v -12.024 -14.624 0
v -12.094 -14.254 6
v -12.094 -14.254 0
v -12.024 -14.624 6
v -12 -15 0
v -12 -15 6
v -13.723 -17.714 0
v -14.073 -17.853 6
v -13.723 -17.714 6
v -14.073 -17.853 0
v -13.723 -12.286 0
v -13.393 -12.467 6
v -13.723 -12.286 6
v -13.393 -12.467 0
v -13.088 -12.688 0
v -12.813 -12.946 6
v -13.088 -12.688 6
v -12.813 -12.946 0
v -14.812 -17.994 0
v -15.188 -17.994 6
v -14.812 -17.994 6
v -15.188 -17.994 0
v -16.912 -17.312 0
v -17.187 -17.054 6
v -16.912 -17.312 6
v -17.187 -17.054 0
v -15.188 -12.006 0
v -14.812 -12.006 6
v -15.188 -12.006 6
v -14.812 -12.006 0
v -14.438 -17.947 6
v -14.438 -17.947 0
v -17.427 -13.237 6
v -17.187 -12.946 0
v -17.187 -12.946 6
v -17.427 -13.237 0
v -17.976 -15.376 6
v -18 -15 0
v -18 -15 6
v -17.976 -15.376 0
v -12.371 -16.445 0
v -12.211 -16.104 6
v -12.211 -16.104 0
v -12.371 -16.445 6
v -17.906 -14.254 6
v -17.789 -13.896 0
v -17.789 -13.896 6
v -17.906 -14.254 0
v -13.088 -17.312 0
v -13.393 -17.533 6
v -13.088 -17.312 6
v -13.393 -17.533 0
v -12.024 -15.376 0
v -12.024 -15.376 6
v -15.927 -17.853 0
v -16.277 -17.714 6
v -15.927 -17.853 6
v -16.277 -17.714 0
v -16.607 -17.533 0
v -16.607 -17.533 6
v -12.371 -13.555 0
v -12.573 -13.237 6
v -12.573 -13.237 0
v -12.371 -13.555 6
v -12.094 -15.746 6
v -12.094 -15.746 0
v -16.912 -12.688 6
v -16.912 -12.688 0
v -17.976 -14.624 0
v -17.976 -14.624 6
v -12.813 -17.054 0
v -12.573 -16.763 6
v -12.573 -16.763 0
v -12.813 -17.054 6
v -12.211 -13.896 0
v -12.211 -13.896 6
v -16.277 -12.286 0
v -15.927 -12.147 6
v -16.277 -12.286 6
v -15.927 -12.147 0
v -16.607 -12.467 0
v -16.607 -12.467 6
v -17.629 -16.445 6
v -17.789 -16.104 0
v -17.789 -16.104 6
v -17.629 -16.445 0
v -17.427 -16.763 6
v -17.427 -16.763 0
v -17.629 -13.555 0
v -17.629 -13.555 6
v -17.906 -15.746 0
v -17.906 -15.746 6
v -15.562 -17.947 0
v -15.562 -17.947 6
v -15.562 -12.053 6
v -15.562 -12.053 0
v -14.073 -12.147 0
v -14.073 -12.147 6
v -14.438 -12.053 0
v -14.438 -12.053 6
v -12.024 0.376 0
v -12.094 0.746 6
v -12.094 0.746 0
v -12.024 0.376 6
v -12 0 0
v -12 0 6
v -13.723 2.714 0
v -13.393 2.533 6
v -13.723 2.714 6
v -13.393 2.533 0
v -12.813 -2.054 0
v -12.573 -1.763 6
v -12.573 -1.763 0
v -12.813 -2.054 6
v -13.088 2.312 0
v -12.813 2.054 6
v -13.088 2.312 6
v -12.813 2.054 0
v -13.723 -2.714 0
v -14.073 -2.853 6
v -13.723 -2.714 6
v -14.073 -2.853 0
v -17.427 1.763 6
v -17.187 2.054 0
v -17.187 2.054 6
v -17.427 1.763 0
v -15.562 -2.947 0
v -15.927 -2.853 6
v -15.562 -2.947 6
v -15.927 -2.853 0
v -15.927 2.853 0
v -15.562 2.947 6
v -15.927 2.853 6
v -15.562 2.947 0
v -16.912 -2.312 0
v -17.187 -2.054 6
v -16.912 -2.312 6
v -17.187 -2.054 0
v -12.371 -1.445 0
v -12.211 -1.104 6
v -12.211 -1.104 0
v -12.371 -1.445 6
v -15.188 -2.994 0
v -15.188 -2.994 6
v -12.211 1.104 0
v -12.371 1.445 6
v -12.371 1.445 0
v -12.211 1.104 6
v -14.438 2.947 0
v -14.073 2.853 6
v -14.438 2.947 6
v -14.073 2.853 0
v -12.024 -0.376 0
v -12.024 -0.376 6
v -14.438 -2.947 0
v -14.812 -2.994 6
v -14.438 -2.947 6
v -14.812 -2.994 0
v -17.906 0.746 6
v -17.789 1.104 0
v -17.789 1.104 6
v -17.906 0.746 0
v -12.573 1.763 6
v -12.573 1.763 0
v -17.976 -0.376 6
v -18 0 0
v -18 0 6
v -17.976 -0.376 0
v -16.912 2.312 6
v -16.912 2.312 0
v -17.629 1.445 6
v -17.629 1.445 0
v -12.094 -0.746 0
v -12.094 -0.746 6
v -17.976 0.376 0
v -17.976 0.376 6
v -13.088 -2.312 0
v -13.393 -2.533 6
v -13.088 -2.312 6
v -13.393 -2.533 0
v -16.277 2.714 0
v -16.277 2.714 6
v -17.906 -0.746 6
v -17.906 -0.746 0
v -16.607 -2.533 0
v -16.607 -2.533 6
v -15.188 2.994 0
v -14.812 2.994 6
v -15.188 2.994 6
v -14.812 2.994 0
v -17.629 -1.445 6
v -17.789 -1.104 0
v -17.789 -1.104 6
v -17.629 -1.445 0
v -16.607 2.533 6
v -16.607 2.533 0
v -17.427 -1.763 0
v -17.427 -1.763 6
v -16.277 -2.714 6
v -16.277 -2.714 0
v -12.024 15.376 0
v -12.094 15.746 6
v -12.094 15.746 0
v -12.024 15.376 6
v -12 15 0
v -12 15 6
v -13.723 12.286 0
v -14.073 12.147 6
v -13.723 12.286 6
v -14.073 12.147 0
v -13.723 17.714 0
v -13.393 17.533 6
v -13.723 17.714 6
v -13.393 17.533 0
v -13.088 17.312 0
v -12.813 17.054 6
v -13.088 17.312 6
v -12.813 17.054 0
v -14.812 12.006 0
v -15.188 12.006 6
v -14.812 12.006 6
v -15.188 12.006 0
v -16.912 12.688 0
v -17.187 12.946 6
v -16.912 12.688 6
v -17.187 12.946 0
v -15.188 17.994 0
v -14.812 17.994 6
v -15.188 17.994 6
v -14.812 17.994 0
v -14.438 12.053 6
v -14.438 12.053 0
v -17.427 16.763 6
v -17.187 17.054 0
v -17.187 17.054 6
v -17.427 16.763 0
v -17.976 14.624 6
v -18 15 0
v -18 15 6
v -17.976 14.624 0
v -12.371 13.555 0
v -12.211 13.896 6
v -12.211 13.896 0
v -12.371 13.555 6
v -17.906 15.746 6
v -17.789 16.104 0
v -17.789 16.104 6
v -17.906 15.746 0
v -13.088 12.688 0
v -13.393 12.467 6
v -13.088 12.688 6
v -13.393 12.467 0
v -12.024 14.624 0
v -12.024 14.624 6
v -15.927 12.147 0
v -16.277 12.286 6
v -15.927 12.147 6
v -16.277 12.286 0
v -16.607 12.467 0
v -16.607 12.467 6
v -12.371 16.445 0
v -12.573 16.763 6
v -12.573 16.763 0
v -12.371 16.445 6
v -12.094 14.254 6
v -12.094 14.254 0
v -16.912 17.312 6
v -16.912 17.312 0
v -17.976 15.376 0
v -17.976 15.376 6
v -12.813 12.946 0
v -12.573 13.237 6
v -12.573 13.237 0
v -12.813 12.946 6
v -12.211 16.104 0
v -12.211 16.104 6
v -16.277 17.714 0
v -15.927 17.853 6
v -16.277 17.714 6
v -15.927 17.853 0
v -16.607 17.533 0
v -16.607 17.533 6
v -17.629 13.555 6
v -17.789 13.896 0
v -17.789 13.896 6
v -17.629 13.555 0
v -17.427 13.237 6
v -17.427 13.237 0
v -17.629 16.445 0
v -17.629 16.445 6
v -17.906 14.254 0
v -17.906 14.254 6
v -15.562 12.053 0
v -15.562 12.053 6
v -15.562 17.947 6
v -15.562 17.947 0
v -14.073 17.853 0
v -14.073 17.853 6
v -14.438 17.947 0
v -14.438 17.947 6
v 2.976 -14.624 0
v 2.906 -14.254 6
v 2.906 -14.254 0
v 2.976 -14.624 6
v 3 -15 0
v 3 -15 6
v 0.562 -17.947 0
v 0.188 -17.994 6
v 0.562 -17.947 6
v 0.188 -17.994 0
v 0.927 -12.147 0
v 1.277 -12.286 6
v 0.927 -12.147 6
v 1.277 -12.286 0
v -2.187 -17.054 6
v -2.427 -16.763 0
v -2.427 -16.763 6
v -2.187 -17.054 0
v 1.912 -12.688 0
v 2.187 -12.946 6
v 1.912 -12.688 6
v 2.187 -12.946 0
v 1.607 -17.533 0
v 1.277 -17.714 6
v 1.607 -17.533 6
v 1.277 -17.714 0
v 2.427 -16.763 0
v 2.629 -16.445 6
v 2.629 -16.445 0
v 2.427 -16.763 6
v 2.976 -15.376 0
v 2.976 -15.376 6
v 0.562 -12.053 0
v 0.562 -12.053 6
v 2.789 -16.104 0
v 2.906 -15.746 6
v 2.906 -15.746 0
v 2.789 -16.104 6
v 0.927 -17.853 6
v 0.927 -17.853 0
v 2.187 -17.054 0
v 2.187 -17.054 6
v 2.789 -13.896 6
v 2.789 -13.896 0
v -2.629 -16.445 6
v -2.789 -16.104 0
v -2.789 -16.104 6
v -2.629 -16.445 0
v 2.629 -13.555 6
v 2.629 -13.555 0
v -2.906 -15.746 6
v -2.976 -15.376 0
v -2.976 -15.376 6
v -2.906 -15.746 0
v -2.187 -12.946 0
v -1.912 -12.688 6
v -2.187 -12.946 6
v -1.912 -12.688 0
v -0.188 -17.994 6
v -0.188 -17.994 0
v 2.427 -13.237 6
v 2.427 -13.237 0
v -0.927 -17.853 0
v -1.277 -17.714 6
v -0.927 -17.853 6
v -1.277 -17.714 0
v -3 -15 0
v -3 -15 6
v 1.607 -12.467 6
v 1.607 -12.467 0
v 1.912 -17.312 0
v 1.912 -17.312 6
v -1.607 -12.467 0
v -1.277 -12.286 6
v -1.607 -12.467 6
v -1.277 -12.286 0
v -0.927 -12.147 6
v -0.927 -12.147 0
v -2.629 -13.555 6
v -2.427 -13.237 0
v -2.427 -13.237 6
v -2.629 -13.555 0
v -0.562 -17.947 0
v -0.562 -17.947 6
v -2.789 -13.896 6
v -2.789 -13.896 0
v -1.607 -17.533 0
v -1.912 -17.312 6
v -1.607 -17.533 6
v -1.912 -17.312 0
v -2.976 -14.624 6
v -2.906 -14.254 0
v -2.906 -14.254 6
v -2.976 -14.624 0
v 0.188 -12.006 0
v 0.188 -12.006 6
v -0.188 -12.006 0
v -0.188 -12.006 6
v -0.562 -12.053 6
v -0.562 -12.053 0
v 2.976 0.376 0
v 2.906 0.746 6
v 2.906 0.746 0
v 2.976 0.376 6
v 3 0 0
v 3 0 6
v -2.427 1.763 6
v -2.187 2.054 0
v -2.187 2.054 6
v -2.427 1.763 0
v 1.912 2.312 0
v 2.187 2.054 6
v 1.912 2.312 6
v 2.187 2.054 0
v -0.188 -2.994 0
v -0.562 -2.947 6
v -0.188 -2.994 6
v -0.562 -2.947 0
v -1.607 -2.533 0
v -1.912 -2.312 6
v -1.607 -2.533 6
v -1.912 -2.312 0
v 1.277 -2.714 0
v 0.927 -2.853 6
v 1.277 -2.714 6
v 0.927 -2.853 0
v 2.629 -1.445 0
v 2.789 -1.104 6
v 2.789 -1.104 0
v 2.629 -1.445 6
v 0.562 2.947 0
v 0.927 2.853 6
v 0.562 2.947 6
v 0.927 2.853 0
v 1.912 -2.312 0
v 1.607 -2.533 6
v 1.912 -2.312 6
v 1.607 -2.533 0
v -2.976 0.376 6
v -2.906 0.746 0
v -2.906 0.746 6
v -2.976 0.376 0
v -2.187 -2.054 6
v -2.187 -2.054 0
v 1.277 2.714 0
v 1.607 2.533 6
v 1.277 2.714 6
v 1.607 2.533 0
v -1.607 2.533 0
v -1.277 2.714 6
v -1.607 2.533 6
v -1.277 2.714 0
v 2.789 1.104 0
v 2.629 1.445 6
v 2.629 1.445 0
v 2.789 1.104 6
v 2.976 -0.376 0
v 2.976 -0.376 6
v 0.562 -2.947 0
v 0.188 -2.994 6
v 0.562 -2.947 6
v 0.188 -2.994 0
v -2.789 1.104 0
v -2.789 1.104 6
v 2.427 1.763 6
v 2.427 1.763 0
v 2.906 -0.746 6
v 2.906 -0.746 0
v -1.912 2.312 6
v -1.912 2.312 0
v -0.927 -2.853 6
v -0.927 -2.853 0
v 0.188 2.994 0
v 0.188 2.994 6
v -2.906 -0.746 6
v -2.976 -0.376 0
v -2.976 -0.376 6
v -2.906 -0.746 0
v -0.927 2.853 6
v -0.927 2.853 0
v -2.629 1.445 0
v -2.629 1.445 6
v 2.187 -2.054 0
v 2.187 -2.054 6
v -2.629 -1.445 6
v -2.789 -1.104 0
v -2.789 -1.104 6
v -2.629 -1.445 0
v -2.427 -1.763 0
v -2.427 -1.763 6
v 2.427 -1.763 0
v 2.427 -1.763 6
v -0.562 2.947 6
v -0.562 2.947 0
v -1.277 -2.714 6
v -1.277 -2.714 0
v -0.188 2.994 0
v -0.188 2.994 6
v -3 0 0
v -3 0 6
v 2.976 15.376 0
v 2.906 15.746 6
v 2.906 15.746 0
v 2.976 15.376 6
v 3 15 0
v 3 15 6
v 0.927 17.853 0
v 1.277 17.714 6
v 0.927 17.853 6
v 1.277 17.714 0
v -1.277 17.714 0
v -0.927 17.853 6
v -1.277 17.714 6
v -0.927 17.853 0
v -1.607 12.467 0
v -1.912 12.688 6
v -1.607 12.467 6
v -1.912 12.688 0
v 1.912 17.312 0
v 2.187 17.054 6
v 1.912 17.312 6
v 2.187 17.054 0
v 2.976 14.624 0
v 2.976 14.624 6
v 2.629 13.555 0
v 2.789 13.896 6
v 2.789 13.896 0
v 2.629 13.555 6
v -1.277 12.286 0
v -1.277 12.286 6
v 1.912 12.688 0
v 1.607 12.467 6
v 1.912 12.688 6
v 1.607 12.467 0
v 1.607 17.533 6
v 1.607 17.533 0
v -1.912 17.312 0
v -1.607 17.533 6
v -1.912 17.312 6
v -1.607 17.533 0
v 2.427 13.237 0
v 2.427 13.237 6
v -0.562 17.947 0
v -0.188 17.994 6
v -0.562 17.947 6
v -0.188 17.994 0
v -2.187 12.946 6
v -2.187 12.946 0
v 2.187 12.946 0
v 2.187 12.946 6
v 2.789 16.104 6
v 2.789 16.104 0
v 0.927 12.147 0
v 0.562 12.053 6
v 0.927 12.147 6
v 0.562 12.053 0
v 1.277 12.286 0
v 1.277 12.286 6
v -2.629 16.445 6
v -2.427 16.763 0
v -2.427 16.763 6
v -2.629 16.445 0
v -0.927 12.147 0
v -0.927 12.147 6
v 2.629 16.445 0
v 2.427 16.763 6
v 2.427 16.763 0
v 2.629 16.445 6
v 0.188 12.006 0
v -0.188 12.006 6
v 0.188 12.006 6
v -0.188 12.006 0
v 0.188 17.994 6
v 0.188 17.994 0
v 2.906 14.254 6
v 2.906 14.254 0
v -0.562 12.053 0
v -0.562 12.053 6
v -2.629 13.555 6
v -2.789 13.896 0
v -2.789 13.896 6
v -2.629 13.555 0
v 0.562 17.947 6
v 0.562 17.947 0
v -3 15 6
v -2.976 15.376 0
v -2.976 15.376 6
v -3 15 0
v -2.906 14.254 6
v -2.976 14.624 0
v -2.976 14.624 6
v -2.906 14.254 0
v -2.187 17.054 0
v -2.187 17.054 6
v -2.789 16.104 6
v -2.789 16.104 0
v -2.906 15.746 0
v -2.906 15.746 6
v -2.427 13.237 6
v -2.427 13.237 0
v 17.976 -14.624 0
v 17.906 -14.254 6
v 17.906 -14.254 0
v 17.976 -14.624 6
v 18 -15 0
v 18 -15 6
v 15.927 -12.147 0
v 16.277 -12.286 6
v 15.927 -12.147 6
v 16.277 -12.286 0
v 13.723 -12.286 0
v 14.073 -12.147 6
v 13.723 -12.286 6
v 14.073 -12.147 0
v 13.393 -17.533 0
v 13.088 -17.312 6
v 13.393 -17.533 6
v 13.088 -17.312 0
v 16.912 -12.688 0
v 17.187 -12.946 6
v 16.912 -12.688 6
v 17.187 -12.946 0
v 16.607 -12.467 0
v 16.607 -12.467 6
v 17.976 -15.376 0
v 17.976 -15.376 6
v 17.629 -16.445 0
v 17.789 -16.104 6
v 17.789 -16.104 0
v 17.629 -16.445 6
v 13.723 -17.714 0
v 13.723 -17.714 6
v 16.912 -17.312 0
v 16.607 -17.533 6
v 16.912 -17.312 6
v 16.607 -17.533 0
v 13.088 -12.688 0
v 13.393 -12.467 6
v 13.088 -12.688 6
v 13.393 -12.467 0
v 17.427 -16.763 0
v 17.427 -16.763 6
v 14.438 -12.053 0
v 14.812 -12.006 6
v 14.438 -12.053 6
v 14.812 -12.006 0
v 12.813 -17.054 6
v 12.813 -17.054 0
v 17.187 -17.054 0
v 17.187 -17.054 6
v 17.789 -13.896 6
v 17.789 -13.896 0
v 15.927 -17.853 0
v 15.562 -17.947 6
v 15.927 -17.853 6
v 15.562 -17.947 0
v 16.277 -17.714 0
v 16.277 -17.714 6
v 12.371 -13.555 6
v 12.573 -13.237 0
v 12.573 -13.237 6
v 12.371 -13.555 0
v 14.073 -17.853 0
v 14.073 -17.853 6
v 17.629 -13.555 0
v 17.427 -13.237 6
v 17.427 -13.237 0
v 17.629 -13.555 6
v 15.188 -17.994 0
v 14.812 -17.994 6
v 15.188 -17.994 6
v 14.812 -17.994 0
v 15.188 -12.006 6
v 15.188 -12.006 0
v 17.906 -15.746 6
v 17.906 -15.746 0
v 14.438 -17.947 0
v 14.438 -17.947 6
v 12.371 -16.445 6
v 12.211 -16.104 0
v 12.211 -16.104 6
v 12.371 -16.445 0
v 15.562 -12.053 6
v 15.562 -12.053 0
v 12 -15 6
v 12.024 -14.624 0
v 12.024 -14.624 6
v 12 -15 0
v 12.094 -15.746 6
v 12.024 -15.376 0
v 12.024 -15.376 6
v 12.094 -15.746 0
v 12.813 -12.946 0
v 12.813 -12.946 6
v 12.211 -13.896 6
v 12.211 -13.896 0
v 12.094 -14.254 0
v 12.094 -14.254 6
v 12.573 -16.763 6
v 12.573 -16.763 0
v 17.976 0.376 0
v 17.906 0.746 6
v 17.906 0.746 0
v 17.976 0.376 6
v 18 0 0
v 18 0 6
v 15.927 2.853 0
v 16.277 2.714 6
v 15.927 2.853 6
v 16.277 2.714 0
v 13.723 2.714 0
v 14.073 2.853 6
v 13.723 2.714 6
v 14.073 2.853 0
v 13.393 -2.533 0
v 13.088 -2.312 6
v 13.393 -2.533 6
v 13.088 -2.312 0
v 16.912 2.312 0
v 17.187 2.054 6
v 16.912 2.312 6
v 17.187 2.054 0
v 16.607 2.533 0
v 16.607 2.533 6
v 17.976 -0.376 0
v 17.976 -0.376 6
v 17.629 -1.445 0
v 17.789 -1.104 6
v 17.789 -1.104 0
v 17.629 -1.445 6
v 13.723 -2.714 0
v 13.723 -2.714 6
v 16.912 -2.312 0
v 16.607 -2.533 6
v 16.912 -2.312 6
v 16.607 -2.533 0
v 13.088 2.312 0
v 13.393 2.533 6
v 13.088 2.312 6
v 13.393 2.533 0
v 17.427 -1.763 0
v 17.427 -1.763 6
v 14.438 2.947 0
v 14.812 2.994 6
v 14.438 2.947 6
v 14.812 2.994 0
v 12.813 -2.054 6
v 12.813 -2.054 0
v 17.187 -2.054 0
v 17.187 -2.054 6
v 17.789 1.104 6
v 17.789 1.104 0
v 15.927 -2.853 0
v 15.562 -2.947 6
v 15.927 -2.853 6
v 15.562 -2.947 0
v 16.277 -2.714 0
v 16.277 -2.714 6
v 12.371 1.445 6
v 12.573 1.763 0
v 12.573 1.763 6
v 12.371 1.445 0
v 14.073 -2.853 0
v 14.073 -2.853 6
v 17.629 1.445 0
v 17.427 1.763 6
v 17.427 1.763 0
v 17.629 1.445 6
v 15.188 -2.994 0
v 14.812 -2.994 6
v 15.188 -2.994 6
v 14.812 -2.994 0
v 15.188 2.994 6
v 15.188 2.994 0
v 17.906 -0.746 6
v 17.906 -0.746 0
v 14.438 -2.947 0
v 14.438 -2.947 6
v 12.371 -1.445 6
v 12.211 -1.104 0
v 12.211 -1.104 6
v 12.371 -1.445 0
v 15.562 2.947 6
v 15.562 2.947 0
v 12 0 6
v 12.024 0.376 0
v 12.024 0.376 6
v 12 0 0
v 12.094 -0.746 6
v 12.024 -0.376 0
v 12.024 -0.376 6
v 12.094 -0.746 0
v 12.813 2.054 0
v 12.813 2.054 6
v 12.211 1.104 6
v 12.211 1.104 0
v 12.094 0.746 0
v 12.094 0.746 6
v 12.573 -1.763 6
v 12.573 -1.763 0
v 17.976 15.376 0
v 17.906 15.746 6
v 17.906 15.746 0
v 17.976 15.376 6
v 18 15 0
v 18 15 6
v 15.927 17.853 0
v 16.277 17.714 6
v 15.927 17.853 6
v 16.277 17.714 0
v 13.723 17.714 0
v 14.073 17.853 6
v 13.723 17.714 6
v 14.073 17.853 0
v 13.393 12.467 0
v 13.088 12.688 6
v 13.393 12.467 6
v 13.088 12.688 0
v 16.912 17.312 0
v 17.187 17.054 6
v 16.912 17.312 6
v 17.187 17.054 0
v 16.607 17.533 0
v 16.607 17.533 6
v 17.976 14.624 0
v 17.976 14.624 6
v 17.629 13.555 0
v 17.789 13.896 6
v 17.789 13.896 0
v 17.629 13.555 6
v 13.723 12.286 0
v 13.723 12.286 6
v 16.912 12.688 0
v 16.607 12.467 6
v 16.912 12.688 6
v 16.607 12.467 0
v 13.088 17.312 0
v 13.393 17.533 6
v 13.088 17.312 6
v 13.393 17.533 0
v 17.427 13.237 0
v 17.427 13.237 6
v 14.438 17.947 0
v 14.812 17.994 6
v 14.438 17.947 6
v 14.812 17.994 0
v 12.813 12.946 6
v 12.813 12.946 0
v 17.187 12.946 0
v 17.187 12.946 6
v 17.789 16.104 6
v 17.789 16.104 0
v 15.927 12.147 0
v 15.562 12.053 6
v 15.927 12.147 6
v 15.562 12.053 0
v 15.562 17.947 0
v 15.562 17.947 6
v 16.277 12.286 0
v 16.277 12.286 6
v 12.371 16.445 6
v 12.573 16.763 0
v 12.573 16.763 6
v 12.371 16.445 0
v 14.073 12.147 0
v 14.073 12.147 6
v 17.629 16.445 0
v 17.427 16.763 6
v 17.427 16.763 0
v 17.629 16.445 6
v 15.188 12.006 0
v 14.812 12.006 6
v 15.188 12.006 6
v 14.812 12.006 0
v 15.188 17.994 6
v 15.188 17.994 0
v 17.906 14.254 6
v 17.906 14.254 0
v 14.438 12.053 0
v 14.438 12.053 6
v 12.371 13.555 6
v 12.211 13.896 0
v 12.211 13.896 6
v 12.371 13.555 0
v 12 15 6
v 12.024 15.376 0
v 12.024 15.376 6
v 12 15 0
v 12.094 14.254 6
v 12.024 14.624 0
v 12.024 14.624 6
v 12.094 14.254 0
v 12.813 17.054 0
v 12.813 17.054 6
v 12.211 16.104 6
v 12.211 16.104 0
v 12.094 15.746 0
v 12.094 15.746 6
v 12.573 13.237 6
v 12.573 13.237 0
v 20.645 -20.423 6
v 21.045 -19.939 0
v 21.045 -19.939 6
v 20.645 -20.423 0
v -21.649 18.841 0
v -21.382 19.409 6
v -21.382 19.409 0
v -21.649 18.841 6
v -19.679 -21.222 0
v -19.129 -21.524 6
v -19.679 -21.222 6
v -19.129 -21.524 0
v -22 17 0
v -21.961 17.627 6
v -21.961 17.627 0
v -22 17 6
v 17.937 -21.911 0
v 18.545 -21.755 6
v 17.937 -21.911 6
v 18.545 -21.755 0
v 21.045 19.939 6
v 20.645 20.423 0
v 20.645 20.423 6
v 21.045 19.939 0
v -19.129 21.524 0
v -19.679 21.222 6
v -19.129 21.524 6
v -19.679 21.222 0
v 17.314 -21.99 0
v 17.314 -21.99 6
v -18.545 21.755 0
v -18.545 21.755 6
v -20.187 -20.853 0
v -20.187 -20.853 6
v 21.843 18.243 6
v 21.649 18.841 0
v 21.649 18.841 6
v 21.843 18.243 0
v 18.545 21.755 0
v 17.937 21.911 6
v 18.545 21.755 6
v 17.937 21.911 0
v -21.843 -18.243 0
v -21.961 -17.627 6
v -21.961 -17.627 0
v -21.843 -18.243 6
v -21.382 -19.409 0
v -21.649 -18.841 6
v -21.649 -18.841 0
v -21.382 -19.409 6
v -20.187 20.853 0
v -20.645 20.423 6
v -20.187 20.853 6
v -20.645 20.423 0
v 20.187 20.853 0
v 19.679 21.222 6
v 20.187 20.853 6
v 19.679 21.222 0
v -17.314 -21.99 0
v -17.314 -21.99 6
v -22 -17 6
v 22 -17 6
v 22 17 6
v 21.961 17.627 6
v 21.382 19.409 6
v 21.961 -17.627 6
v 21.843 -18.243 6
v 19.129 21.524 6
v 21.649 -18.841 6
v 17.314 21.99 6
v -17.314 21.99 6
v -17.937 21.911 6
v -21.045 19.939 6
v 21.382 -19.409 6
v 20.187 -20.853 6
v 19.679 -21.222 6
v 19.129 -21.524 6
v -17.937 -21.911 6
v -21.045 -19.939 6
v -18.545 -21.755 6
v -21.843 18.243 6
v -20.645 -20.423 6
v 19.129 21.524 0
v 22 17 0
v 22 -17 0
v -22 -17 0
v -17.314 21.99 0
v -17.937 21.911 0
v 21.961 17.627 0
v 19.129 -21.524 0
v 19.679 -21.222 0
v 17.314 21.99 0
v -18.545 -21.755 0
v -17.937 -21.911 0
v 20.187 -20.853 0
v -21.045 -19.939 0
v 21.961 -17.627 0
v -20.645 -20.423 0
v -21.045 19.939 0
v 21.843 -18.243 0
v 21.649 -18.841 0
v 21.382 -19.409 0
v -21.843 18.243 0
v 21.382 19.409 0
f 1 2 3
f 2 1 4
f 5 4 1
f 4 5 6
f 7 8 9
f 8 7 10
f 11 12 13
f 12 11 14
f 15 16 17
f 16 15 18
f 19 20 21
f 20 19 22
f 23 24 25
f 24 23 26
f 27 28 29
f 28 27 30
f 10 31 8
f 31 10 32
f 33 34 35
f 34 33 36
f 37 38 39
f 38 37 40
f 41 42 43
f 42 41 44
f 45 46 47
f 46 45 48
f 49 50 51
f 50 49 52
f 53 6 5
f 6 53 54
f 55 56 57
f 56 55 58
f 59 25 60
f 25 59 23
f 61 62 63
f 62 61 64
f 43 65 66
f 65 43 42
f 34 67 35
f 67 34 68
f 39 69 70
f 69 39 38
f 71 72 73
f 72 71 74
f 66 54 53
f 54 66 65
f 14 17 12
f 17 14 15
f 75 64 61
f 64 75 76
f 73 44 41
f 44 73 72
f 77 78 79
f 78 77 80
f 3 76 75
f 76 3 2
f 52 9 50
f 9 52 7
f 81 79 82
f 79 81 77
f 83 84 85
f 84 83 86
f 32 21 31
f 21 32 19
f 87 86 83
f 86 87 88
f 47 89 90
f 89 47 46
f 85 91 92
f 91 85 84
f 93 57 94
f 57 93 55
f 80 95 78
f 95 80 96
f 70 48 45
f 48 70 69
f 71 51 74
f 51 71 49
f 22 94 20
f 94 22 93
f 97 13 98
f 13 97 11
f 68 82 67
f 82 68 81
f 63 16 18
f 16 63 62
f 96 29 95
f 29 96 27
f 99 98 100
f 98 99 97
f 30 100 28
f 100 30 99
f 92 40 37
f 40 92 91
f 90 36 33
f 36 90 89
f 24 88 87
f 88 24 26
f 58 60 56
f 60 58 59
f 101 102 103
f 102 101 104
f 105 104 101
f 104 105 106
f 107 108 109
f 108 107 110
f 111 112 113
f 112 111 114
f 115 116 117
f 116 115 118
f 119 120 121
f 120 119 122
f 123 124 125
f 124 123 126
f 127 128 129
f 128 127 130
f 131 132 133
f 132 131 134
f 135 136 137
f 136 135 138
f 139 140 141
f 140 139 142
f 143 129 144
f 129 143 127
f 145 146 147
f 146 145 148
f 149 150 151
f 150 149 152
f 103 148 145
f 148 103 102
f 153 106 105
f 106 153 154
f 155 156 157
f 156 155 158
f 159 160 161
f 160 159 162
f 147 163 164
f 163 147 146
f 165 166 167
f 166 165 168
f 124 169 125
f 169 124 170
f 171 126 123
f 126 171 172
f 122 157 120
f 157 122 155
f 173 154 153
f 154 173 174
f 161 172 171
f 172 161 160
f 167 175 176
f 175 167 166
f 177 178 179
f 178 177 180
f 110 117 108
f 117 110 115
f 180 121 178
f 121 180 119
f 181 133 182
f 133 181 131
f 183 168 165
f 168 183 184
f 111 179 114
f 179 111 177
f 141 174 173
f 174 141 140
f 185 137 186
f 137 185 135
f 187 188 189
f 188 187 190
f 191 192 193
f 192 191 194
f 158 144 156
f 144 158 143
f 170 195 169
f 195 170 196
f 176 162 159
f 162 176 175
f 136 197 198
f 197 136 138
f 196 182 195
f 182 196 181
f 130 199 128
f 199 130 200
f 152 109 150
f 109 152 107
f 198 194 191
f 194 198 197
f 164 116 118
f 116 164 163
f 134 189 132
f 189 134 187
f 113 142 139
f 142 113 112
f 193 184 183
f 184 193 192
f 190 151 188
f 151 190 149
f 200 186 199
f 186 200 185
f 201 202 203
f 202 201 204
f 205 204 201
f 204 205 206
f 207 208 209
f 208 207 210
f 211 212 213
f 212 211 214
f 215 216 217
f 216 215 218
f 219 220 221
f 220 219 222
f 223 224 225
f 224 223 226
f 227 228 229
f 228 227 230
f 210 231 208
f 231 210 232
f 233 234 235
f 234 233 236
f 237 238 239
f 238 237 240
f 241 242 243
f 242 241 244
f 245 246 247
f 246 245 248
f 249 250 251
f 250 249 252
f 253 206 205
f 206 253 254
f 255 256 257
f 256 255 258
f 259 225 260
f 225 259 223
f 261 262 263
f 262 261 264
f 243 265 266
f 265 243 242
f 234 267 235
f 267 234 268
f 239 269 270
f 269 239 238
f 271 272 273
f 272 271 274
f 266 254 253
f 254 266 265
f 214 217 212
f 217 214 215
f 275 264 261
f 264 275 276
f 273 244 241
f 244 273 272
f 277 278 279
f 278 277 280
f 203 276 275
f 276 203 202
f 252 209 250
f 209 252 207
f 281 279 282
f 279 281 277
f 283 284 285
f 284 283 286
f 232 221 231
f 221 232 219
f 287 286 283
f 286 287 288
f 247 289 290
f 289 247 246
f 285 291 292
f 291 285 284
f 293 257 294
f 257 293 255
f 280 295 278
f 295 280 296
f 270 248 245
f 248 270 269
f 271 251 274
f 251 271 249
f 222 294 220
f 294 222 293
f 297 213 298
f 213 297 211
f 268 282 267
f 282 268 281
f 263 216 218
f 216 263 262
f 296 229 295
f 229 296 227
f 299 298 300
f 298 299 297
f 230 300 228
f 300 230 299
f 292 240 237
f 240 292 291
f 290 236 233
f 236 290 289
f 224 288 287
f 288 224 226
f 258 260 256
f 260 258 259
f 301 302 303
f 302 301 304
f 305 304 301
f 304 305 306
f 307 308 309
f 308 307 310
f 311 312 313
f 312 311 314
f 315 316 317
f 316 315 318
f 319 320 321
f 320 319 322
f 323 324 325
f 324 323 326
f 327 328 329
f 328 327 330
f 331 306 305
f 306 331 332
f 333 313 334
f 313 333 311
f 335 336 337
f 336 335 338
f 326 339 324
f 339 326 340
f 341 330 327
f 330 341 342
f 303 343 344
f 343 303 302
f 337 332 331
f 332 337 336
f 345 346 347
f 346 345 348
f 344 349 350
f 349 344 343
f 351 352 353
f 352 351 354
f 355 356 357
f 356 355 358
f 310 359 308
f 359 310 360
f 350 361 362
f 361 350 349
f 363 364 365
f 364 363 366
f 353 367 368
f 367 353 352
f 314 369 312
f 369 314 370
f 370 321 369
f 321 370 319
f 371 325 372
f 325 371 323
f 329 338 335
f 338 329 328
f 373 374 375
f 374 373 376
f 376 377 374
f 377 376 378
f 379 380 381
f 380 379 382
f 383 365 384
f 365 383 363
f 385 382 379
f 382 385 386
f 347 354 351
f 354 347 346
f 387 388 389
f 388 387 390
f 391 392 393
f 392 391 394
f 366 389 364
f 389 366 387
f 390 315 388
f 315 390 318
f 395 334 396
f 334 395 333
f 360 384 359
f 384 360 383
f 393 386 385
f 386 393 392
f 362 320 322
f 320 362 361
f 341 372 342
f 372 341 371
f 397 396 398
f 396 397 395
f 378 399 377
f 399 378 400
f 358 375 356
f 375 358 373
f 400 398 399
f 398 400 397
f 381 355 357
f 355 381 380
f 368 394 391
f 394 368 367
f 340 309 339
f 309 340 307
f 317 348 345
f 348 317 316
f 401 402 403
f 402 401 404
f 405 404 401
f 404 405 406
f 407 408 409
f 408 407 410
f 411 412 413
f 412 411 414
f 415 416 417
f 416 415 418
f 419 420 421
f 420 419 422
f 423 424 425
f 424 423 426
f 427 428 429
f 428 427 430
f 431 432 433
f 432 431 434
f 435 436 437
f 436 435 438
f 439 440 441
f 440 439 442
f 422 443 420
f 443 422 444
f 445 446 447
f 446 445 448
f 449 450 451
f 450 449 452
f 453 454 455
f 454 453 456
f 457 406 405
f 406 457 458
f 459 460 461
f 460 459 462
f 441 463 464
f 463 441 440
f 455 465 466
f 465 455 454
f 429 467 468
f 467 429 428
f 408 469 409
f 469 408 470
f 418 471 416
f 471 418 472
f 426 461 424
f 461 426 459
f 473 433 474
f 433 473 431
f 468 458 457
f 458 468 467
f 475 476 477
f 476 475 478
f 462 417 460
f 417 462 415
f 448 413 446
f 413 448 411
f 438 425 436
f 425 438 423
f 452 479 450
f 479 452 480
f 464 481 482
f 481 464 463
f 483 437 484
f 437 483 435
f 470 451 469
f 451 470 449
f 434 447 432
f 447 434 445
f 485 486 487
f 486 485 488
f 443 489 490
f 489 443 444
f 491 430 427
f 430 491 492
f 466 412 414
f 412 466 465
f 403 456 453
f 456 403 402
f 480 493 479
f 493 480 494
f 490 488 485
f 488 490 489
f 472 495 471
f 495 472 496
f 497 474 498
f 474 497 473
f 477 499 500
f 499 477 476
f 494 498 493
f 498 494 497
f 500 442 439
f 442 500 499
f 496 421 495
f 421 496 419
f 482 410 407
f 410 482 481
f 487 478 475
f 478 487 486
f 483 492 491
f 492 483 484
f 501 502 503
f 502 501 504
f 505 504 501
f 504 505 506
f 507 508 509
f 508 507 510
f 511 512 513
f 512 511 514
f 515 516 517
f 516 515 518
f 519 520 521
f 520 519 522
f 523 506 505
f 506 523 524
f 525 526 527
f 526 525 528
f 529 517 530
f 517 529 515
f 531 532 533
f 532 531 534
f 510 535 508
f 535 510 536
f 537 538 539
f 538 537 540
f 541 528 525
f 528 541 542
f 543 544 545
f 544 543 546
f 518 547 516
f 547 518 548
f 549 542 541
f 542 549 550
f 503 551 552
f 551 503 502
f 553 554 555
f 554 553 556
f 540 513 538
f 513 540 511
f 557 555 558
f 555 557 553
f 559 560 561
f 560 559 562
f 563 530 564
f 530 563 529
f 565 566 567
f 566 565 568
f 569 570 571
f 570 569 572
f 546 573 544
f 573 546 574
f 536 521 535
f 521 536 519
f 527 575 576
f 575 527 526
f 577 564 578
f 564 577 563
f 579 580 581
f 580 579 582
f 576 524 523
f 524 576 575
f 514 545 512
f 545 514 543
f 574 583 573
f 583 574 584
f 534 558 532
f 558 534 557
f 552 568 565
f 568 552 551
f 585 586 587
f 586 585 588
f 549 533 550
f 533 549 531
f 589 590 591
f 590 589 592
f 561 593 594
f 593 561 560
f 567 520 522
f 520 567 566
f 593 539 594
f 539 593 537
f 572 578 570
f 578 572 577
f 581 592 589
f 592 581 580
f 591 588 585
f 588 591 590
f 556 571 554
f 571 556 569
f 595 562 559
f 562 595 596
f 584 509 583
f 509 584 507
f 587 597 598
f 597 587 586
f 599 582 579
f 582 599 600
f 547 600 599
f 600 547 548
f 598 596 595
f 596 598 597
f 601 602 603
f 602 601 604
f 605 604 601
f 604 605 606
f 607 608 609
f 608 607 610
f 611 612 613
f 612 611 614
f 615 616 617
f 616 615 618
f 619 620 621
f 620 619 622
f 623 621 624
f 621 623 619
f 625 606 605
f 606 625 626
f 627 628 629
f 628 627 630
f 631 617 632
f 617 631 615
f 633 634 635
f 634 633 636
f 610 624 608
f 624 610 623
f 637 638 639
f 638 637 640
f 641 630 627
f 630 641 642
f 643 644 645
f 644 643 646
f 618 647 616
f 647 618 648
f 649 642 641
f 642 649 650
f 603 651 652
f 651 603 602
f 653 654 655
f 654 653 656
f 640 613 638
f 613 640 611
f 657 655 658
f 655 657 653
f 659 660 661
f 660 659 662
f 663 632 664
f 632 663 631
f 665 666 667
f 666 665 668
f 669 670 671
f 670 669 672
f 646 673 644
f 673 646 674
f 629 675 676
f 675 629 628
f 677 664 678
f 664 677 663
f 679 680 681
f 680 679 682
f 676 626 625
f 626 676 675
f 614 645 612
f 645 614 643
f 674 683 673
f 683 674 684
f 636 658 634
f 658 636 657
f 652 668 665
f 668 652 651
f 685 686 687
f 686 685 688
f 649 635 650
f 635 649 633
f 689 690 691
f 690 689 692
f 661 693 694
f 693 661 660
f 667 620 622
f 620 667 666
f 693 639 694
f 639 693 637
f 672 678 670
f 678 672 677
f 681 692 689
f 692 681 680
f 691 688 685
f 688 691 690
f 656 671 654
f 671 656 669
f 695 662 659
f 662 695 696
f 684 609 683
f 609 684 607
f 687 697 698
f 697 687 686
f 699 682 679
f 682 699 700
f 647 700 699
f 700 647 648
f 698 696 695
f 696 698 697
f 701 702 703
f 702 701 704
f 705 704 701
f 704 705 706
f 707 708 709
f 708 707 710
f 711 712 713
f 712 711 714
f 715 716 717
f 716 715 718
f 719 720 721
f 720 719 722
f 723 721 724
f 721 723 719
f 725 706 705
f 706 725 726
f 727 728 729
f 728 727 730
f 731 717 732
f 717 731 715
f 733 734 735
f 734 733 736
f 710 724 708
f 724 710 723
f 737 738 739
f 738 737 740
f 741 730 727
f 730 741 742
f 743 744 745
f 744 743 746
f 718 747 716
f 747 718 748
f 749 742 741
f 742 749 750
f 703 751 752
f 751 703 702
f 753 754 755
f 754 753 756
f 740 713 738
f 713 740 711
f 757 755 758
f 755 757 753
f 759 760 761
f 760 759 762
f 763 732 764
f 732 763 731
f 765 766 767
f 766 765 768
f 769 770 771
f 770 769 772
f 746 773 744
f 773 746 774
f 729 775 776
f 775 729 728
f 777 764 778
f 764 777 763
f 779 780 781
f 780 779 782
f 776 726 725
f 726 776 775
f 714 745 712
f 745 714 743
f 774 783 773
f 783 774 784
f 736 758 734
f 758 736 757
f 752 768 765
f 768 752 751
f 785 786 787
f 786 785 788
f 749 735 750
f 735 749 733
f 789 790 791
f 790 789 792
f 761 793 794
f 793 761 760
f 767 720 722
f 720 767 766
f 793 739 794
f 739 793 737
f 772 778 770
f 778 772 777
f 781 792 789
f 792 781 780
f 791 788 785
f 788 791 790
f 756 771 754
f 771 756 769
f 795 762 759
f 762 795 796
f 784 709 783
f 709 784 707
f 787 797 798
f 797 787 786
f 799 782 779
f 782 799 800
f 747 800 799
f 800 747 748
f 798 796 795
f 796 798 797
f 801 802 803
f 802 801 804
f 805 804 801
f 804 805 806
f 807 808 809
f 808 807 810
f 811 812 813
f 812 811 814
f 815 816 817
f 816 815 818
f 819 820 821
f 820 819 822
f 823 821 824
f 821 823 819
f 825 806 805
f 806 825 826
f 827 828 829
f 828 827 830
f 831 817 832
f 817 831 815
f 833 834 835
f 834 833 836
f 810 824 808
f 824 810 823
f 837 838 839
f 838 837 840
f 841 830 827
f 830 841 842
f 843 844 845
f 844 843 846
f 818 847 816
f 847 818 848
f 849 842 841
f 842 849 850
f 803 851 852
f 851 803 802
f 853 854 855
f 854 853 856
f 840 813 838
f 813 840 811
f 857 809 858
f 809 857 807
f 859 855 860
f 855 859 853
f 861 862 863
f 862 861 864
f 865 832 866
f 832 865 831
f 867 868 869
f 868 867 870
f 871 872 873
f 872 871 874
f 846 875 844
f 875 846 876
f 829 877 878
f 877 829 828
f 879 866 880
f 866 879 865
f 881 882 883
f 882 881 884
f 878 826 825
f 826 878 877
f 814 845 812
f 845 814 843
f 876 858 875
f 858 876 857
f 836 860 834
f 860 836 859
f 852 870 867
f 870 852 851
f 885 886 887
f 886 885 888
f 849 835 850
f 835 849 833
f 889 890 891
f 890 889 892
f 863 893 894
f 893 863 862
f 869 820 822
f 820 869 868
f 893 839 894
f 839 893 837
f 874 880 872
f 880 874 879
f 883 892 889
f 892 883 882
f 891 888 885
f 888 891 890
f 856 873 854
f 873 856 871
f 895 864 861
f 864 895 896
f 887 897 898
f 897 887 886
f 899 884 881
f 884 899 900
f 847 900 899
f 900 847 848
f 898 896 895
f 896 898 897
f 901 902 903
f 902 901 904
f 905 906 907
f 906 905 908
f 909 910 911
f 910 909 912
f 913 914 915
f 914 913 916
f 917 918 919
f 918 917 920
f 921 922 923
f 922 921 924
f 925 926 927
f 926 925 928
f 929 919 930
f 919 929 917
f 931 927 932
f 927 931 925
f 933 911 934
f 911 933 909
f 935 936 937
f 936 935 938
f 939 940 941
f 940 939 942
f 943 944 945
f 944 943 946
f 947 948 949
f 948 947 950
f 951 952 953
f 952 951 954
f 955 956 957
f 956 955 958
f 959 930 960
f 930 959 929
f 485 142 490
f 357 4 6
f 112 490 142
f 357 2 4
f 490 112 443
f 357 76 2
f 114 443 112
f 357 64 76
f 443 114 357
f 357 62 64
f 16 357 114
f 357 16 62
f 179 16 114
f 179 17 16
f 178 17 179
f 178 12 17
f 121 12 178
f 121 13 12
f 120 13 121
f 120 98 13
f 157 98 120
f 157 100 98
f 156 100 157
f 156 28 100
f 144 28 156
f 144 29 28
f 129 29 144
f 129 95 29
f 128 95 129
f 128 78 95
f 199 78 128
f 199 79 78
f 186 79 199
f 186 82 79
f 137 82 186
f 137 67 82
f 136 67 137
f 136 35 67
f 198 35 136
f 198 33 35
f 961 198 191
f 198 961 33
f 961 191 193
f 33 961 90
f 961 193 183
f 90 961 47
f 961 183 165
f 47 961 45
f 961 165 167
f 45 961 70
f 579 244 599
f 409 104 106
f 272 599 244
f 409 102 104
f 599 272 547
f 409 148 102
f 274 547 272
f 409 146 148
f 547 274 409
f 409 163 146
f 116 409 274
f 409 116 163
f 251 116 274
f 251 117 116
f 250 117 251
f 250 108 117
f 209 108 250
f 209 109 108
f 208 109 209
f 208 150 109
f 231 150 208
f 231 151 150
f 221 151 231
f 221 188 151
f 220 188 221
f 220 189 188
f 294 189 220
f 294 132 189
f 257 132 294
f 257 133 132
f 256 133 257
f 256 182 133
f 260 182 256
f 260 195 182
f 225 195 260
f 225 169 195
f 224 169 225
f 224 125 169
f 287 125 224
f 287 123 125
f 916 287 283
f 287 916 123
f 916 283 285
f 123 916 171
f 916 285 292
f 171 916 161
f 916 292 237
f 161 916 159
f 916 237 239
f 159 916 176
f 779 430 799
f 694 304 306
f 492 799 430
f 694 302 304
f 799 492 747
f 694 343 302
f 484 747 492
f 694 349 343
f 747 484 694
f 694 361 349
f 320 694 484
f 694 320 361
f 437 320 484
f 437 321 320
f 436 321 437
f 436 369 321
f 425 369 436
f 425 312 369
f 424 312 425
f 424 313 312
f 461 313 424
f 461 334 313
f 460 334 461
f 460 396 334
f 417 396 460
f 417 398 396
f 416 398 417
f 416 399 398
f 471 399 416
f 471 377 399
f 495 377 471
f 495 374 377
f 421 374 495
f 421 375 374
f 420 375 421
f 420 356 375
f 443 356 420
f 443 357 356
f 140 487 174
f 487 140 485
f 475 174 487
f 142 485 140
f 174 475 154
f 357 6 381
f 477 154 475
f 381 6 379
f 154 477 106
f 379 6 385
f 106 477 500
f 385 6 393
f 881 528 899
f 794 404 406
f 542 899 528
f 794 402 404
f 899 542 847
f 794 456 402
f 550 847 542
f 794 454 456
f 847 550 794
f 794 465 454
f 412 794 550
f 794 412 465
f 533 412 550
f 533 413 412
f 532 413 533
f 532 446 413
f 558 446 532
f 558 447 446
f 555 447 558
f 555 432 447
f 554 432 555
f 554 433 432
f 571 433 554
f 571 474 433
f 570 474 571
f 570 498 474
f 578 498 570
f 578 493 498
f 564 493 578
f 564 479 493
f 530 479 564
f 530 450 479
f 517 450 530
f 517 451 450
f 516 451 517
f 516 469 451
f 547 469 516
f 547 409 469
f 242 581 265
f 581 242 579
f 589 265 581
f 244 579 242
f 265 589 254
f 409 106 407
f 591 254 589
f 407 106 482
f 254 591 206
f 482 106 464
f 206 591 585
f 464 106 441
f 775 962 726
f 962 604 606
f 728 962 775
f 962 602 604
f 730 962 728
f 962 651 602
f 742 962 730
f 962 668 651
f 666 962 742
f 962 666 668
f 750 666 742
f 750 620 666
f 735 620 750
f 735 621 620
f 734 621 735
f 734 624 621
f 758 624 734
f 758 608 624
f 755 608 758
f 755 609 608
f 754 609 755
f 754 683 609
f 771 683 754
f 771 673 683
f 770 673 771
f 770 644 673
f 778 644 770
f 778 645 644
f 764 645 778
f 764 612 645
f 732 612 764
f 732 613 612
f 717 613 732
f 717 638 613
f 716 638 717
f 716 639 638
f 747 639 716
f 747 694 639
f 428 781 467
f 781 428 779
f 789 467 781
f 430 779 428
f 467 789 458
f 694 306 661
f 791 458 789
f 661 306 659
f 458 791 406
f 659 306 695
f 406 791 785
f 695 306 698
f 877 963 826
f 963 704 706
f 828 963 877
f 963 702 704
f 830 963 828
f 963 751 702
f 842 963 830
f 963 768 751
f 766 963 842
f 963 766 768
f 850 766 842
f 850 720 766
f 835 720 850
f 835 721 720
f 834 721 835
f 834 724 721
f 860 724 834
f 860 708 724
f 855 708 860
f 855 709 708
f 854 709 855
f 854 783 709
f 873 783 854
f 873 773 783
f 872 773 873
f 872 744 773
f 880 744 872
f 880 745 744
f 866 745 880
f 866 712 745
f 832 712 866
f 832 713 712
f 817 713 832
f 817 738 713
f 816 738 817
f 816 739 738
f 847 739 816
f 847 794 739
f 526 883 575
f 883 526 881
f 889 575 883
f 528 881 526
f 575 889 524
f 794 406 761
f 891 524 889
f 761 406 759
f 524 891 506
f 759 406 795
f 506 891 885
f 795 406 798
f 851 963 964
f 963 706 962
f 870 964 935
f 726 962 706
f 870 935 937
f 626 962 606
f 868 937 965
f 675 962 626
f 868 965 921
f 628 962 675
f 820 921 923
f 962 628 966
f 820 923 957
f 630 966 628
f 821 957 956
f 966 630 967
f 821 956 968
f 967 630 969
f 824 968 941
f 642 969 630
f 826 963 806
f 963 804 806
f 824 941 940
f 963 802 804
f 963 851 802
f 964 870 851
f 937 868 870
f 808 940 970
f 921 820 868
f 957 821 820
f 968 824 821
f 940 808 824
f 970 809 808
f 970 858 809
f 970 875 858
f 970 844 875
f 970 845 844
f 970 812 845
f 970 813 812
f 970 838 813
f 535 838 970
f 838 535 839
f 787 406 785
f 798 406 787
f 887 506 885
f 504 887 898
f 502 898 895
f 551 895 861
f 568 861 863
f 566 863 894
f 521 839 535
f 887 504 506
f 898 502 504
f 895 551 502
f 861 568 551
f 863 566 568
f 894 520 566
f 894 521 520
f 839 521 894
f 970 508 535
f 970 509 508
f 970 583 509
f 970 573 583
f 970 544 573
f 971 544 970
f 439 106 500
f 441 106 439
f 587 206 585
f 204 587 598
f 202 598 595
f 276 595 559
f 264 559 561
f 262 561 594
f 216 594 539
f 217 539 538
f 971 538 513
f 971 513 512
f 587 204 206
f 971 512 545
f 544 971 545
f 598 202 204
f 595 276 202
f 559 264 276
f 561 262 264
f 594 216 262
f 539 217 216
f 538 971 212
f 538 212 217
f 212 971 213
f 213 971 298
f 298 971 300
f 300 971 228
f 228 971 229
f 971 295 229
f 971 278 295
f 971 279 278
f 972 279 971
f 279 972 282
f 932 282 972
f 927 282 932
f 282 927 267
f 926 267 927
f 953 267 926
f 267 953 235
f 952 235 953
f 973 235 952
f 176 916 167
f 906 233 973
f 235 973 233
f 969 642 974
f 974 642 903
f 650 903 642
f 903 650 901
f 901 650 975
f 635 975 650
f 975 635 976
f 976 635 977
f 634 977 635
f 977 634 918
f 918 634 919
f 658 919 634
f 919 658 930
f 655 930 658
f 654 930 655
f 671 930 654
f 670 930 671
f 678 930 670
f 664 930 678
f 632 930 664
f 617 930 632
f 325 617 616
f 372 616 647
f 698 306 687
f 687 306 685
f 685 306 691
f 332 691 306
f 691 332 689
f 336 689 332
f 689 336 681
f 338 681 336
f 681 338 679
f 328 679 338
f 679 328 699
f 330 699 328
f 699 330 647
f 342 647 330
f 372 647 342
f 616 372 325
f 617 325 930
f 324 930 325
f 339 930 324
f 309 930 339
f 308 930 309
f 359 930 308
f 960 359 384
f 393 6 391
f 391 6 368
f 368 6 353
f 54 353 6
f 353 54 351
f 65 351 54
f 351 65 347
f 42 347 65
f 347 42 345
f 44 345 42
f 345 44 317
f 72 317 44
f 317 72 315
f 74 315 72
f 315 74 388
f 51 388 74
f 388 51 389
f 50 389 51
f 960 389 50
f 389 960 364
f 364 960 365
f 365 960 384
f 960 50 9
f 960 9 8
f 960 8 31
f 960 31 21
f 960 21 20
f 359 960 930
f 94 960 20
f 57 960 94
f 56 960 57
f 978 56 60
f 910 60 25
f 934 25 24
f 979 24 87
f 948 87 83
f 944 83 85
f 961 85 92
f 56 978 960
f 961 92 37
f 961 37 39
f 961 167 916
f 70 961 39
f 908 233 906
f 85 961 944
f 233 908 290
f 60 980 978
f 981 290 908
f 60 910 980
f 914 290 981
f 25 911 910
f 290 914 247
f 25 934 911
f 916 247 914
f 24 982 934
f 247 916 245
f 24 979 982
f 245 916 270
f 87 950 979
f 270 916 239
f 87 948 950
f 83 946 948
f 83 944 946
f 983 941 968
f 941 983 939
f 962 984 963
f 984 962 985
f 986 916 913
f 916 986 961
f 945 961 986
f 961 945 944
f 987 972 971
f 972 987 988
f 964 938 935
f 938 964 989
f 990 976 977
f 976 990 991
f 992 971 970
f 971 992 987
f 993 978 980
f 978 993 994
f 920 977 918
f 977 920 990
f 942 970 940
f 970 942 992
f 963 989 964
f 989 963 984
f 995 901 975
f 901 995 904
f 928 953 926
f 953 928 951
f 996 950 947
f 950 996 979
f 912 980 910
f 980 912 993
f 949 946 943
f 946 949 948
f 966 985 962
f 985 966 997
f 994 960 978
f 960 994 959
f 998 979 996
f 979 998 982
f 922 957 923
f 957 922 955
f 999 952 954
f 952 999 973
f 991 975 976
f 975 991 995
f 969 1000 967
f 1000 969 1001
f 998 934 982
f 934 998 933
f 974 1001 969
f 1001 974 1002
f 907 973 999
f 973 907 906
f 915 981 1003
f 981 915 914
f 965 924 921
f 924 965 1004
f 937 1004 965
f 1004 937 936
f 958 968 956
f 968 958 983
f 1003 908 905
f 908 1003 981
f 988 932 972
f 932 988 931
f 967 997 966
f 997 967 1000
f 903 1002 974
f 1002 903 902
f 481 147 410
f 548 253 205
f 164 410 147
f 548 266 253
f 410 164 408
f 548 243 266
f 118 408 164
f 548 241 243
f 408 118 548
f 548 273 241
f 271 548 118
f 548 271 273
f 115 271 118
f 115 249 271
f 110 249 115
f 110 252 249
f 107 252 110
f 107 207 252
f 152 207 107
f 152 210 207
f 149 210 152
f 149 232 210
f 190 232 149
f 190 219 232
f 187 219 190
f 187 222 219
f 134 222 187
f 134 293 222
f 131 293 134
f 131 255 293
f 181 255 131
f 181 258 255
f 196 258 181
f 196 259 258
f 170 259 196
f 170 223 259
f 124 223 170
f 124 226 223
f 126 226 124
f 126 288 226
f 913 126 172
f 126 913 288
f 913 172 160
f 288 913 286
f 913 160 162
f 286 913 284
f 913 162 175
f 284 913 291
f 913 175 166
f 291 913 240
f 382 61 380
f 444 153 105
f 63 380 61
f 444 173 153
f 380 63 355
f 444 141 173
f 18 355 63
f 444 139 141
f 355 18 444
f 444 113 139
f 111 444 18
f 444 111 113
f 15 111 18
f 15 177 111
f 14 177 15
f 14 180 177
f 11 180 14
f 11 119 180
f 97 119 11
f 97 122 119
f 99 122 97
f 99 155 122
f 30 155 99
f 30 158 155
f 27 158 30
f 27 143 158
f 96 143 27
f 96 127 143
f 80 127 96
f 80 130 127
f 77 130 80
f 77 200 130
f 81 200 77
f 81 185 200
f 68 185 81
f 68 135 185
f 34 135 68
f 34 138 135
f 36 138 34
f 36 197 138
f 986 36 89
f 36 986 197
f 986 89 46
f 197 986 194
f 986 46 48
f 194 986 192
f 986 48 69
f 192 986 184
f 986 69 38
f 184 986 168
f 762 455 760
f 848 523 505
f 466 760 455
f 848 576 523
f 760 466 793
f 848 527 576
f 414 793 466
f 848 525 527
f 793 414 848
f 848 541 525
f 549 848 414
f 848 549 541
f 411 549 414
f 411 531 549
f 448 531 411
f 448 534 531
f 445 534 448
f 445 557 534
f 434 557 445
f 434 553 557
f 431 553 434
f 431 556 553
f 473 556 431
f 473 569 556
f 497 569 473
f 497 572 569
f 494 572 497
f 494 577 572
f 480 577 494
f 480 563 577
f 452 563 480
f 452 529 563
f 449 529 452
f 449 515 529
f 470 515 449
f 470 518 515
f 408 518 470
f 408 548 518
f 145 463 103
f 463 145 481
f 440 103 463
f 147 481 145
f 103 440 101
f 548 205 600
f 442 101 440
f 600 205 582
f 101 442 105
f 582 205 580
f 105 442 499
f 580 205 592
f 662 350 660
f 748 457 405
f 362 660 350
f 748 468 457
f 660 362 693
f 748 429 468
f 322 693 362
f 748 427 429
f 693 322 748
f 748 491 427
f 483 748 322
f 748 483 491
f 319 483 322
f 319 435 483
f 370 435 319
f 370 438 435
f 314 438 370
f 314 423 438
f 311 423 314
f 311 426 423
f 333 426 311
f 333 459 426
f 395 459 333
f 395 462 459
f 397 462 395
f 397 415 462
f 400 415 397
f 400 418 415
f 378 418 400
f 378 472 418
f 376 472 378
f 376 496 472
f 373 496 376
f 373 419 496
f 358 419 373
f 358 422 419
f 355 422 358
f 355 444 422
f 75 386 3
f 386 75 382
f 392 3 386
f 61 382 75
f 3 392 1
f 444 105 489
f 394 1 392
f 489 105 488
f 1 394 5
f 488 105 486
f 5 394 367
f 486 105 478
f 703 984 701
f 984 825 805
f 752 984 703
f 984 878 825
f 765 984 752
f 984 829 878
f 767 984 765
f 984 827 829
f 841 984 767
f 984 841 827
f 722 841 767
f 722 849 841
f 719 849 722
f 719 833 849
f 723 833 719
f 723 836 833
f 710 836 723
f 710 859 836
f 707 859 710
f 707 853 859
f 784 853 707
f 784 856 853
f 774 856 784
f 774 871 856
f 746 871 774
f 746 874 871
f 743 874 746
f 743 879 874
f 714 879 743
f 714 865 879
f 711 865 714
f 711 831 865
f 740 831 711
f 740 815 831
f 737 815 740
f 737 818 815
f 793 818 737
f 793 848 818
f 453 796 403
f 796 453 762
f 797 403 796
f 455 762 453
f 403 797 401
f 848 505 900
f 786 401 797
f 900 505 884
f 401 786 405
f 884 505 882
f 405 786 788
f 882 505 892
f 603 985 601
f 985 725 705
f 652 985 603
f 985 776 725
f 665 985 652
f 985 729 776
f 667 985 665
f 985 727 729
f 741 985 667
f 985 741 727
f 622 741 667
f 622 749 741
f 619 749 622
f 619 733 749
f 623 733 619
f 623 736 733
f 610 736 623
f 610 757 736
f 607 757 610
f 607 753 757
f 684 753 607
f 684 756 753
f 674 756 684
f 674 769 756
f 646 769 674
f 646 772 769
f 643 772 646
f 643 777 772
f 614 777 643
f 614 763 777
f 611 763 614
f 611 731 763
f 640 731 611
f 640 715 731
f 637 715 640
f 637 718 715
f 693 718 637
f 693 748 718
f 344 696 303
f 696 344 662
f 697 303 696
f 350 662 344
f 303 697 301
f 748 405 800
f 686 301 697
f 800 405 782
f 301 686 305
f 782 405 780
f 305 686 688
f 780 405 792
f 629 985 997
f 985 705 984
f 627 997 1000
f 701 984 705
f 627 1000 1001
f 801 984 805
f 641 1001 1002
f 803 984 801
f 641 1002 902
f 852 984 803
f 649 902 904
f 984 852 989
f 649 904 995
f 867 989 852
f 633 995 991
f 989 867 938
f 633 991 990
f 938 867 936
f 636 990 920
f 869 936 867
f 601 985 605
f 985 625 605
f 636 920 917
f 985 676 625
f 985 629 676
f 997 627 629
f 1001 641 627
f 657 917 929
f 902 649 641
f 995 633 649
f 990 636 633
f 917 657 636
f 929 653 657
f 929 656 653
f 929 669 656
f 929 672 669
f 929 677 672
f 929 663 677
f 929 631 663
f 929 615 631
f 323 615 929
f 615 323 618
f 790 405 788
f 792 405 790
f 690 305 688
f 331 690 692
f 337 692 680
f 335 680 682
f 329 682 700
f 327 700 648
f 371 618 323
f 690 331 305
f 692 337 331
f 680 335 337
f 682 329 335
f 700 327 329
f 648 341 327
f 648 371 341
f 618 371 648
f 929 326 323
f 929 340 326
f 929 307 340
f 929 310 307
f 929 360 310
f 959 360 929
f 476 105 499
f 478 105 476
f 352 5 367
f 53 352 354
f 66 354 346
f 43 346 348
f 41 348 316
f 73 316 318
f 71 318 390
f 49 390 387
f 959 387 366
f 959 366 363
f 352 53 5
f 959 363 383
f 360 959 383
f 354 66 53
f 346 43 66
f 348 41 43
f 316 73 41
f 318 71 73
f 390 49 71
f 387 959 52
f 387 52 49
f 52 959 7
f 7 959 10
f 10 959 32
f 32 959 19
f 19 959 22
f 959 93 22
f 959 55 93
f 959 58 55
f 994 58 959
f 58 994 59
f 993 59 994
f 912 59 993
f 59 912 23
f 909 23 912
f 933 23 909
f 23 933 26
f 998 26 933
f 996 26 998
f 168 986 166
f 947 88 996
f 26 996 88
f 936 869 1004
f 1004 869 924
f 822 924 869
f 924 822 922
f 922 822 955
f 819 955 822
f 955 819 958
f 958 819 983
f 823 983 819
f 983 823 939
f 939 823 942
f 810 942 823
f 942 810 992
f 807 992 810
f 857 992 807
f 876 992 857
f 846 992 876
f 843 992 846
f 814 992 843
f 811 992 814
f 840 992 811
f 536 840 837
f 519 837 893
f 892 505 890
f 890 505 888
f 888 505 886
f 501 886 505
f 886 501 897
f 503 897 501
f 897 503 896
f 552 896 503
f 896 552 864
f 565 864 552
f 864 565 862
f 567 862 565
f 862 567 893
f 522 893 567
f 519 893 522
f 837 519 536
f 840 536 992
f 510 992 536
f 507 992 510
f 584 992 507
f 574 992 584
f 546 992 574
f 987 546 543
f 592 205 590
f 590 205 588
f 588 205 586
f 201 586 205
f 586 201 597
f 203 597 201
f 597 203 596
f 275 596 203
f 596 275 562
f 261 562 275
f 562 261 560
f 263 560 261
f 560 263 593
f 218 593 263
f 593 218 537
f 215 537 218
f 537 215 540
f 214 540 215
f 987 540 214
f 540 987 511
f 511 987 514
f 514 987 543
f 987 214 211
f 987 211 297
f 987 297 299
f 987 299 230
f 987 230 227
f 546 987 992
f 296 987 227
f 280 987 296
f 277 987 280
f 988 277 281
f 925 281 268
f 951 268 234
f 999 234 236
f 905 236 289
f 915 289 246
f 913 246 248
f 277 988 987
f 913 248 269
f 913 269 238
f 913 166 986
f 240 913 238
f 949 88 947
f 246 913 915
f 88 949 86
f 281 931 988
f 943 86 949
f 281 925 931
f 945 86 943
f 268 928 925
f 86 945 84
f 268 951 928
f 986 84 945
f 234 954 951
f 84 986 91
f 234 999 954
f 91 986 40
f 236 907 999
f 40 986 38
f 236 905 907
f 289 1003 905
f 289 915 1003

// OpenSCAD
$fn = 50;


difference() {
	union() {
		hull() {
			translate(v = [-17.0000000000, 17.0000000000, 0]) {
				cylinder(h = 6, r = 5);
			}
			translate(v = [17.0000000000, 17.0000000000, 0]) {
				cylinder(h = 6, r = 5);
			}
			translate(v = [-17.0000000000, -17.0000000000, 0]) {
				cylinder(h = 6, r = 5);
			}
			translate(v = [17.0000000000, -17.0000000000, 0]) {
				cylinder(h = 6, r = 5);
			}
		}
	}
	union() {
		translate(v = [-15.0000000000, -15.0000000000, 0]) {
			translate(v = [0, 0, -100]) {
				cylinder(h = 200, r = 3.0000000000);
			}
		}
		translate(v = [-15.0000000000, 0.0000000000, 0]) {
			translate(v = [0, 0, -100]) {
				cylinder(h = 200, r = 3.0000000000);
			}
		}
		translate(v = [-15.0000000000, 15.0000000000, 0]) {
			translate(v = [0, 0, -100]) {
				cylinder(h = 200, r = 3.0000000000);
			}
		}
		translate(v = [0.0000000000, -15.0000000000, 0]) {
			translate(v = [0, 0, -100]) {
				cylinder(h = 200, r = 3.0000000000);
			}
		}
		translate(v = [0, 0, -100]) {
			cylinder(h = 200, r = 3.0000000000);
		}
		translate(v = [0.0000000000, 15.0000000000, 0]) {
			translate(v = [0, 0, -100]) {
				cylinder(h = 200, r = 3.0000000000);
			}
		}
		translate(v = [15.0000000000, -15.0000000000, 0]) {
			translate(v = [0, 0, -100]) {
				cylinder(h = 200, r = 3.0000000000);
			}
		}
		translate(v = [15.0000000000, 0.0000000000, 0]) {
			translate(v = [0, 0, -100]) {
				cylinder(h = 200, r = 3.0000000000);
			}
		}
		translate(v = [15.0000000000, 15.0000000000, 0]) {
			translate(v = [0, 0, -100]) {
				cylinder(h = 200, r = 3.0000000000);
			}
		}
	}
}
